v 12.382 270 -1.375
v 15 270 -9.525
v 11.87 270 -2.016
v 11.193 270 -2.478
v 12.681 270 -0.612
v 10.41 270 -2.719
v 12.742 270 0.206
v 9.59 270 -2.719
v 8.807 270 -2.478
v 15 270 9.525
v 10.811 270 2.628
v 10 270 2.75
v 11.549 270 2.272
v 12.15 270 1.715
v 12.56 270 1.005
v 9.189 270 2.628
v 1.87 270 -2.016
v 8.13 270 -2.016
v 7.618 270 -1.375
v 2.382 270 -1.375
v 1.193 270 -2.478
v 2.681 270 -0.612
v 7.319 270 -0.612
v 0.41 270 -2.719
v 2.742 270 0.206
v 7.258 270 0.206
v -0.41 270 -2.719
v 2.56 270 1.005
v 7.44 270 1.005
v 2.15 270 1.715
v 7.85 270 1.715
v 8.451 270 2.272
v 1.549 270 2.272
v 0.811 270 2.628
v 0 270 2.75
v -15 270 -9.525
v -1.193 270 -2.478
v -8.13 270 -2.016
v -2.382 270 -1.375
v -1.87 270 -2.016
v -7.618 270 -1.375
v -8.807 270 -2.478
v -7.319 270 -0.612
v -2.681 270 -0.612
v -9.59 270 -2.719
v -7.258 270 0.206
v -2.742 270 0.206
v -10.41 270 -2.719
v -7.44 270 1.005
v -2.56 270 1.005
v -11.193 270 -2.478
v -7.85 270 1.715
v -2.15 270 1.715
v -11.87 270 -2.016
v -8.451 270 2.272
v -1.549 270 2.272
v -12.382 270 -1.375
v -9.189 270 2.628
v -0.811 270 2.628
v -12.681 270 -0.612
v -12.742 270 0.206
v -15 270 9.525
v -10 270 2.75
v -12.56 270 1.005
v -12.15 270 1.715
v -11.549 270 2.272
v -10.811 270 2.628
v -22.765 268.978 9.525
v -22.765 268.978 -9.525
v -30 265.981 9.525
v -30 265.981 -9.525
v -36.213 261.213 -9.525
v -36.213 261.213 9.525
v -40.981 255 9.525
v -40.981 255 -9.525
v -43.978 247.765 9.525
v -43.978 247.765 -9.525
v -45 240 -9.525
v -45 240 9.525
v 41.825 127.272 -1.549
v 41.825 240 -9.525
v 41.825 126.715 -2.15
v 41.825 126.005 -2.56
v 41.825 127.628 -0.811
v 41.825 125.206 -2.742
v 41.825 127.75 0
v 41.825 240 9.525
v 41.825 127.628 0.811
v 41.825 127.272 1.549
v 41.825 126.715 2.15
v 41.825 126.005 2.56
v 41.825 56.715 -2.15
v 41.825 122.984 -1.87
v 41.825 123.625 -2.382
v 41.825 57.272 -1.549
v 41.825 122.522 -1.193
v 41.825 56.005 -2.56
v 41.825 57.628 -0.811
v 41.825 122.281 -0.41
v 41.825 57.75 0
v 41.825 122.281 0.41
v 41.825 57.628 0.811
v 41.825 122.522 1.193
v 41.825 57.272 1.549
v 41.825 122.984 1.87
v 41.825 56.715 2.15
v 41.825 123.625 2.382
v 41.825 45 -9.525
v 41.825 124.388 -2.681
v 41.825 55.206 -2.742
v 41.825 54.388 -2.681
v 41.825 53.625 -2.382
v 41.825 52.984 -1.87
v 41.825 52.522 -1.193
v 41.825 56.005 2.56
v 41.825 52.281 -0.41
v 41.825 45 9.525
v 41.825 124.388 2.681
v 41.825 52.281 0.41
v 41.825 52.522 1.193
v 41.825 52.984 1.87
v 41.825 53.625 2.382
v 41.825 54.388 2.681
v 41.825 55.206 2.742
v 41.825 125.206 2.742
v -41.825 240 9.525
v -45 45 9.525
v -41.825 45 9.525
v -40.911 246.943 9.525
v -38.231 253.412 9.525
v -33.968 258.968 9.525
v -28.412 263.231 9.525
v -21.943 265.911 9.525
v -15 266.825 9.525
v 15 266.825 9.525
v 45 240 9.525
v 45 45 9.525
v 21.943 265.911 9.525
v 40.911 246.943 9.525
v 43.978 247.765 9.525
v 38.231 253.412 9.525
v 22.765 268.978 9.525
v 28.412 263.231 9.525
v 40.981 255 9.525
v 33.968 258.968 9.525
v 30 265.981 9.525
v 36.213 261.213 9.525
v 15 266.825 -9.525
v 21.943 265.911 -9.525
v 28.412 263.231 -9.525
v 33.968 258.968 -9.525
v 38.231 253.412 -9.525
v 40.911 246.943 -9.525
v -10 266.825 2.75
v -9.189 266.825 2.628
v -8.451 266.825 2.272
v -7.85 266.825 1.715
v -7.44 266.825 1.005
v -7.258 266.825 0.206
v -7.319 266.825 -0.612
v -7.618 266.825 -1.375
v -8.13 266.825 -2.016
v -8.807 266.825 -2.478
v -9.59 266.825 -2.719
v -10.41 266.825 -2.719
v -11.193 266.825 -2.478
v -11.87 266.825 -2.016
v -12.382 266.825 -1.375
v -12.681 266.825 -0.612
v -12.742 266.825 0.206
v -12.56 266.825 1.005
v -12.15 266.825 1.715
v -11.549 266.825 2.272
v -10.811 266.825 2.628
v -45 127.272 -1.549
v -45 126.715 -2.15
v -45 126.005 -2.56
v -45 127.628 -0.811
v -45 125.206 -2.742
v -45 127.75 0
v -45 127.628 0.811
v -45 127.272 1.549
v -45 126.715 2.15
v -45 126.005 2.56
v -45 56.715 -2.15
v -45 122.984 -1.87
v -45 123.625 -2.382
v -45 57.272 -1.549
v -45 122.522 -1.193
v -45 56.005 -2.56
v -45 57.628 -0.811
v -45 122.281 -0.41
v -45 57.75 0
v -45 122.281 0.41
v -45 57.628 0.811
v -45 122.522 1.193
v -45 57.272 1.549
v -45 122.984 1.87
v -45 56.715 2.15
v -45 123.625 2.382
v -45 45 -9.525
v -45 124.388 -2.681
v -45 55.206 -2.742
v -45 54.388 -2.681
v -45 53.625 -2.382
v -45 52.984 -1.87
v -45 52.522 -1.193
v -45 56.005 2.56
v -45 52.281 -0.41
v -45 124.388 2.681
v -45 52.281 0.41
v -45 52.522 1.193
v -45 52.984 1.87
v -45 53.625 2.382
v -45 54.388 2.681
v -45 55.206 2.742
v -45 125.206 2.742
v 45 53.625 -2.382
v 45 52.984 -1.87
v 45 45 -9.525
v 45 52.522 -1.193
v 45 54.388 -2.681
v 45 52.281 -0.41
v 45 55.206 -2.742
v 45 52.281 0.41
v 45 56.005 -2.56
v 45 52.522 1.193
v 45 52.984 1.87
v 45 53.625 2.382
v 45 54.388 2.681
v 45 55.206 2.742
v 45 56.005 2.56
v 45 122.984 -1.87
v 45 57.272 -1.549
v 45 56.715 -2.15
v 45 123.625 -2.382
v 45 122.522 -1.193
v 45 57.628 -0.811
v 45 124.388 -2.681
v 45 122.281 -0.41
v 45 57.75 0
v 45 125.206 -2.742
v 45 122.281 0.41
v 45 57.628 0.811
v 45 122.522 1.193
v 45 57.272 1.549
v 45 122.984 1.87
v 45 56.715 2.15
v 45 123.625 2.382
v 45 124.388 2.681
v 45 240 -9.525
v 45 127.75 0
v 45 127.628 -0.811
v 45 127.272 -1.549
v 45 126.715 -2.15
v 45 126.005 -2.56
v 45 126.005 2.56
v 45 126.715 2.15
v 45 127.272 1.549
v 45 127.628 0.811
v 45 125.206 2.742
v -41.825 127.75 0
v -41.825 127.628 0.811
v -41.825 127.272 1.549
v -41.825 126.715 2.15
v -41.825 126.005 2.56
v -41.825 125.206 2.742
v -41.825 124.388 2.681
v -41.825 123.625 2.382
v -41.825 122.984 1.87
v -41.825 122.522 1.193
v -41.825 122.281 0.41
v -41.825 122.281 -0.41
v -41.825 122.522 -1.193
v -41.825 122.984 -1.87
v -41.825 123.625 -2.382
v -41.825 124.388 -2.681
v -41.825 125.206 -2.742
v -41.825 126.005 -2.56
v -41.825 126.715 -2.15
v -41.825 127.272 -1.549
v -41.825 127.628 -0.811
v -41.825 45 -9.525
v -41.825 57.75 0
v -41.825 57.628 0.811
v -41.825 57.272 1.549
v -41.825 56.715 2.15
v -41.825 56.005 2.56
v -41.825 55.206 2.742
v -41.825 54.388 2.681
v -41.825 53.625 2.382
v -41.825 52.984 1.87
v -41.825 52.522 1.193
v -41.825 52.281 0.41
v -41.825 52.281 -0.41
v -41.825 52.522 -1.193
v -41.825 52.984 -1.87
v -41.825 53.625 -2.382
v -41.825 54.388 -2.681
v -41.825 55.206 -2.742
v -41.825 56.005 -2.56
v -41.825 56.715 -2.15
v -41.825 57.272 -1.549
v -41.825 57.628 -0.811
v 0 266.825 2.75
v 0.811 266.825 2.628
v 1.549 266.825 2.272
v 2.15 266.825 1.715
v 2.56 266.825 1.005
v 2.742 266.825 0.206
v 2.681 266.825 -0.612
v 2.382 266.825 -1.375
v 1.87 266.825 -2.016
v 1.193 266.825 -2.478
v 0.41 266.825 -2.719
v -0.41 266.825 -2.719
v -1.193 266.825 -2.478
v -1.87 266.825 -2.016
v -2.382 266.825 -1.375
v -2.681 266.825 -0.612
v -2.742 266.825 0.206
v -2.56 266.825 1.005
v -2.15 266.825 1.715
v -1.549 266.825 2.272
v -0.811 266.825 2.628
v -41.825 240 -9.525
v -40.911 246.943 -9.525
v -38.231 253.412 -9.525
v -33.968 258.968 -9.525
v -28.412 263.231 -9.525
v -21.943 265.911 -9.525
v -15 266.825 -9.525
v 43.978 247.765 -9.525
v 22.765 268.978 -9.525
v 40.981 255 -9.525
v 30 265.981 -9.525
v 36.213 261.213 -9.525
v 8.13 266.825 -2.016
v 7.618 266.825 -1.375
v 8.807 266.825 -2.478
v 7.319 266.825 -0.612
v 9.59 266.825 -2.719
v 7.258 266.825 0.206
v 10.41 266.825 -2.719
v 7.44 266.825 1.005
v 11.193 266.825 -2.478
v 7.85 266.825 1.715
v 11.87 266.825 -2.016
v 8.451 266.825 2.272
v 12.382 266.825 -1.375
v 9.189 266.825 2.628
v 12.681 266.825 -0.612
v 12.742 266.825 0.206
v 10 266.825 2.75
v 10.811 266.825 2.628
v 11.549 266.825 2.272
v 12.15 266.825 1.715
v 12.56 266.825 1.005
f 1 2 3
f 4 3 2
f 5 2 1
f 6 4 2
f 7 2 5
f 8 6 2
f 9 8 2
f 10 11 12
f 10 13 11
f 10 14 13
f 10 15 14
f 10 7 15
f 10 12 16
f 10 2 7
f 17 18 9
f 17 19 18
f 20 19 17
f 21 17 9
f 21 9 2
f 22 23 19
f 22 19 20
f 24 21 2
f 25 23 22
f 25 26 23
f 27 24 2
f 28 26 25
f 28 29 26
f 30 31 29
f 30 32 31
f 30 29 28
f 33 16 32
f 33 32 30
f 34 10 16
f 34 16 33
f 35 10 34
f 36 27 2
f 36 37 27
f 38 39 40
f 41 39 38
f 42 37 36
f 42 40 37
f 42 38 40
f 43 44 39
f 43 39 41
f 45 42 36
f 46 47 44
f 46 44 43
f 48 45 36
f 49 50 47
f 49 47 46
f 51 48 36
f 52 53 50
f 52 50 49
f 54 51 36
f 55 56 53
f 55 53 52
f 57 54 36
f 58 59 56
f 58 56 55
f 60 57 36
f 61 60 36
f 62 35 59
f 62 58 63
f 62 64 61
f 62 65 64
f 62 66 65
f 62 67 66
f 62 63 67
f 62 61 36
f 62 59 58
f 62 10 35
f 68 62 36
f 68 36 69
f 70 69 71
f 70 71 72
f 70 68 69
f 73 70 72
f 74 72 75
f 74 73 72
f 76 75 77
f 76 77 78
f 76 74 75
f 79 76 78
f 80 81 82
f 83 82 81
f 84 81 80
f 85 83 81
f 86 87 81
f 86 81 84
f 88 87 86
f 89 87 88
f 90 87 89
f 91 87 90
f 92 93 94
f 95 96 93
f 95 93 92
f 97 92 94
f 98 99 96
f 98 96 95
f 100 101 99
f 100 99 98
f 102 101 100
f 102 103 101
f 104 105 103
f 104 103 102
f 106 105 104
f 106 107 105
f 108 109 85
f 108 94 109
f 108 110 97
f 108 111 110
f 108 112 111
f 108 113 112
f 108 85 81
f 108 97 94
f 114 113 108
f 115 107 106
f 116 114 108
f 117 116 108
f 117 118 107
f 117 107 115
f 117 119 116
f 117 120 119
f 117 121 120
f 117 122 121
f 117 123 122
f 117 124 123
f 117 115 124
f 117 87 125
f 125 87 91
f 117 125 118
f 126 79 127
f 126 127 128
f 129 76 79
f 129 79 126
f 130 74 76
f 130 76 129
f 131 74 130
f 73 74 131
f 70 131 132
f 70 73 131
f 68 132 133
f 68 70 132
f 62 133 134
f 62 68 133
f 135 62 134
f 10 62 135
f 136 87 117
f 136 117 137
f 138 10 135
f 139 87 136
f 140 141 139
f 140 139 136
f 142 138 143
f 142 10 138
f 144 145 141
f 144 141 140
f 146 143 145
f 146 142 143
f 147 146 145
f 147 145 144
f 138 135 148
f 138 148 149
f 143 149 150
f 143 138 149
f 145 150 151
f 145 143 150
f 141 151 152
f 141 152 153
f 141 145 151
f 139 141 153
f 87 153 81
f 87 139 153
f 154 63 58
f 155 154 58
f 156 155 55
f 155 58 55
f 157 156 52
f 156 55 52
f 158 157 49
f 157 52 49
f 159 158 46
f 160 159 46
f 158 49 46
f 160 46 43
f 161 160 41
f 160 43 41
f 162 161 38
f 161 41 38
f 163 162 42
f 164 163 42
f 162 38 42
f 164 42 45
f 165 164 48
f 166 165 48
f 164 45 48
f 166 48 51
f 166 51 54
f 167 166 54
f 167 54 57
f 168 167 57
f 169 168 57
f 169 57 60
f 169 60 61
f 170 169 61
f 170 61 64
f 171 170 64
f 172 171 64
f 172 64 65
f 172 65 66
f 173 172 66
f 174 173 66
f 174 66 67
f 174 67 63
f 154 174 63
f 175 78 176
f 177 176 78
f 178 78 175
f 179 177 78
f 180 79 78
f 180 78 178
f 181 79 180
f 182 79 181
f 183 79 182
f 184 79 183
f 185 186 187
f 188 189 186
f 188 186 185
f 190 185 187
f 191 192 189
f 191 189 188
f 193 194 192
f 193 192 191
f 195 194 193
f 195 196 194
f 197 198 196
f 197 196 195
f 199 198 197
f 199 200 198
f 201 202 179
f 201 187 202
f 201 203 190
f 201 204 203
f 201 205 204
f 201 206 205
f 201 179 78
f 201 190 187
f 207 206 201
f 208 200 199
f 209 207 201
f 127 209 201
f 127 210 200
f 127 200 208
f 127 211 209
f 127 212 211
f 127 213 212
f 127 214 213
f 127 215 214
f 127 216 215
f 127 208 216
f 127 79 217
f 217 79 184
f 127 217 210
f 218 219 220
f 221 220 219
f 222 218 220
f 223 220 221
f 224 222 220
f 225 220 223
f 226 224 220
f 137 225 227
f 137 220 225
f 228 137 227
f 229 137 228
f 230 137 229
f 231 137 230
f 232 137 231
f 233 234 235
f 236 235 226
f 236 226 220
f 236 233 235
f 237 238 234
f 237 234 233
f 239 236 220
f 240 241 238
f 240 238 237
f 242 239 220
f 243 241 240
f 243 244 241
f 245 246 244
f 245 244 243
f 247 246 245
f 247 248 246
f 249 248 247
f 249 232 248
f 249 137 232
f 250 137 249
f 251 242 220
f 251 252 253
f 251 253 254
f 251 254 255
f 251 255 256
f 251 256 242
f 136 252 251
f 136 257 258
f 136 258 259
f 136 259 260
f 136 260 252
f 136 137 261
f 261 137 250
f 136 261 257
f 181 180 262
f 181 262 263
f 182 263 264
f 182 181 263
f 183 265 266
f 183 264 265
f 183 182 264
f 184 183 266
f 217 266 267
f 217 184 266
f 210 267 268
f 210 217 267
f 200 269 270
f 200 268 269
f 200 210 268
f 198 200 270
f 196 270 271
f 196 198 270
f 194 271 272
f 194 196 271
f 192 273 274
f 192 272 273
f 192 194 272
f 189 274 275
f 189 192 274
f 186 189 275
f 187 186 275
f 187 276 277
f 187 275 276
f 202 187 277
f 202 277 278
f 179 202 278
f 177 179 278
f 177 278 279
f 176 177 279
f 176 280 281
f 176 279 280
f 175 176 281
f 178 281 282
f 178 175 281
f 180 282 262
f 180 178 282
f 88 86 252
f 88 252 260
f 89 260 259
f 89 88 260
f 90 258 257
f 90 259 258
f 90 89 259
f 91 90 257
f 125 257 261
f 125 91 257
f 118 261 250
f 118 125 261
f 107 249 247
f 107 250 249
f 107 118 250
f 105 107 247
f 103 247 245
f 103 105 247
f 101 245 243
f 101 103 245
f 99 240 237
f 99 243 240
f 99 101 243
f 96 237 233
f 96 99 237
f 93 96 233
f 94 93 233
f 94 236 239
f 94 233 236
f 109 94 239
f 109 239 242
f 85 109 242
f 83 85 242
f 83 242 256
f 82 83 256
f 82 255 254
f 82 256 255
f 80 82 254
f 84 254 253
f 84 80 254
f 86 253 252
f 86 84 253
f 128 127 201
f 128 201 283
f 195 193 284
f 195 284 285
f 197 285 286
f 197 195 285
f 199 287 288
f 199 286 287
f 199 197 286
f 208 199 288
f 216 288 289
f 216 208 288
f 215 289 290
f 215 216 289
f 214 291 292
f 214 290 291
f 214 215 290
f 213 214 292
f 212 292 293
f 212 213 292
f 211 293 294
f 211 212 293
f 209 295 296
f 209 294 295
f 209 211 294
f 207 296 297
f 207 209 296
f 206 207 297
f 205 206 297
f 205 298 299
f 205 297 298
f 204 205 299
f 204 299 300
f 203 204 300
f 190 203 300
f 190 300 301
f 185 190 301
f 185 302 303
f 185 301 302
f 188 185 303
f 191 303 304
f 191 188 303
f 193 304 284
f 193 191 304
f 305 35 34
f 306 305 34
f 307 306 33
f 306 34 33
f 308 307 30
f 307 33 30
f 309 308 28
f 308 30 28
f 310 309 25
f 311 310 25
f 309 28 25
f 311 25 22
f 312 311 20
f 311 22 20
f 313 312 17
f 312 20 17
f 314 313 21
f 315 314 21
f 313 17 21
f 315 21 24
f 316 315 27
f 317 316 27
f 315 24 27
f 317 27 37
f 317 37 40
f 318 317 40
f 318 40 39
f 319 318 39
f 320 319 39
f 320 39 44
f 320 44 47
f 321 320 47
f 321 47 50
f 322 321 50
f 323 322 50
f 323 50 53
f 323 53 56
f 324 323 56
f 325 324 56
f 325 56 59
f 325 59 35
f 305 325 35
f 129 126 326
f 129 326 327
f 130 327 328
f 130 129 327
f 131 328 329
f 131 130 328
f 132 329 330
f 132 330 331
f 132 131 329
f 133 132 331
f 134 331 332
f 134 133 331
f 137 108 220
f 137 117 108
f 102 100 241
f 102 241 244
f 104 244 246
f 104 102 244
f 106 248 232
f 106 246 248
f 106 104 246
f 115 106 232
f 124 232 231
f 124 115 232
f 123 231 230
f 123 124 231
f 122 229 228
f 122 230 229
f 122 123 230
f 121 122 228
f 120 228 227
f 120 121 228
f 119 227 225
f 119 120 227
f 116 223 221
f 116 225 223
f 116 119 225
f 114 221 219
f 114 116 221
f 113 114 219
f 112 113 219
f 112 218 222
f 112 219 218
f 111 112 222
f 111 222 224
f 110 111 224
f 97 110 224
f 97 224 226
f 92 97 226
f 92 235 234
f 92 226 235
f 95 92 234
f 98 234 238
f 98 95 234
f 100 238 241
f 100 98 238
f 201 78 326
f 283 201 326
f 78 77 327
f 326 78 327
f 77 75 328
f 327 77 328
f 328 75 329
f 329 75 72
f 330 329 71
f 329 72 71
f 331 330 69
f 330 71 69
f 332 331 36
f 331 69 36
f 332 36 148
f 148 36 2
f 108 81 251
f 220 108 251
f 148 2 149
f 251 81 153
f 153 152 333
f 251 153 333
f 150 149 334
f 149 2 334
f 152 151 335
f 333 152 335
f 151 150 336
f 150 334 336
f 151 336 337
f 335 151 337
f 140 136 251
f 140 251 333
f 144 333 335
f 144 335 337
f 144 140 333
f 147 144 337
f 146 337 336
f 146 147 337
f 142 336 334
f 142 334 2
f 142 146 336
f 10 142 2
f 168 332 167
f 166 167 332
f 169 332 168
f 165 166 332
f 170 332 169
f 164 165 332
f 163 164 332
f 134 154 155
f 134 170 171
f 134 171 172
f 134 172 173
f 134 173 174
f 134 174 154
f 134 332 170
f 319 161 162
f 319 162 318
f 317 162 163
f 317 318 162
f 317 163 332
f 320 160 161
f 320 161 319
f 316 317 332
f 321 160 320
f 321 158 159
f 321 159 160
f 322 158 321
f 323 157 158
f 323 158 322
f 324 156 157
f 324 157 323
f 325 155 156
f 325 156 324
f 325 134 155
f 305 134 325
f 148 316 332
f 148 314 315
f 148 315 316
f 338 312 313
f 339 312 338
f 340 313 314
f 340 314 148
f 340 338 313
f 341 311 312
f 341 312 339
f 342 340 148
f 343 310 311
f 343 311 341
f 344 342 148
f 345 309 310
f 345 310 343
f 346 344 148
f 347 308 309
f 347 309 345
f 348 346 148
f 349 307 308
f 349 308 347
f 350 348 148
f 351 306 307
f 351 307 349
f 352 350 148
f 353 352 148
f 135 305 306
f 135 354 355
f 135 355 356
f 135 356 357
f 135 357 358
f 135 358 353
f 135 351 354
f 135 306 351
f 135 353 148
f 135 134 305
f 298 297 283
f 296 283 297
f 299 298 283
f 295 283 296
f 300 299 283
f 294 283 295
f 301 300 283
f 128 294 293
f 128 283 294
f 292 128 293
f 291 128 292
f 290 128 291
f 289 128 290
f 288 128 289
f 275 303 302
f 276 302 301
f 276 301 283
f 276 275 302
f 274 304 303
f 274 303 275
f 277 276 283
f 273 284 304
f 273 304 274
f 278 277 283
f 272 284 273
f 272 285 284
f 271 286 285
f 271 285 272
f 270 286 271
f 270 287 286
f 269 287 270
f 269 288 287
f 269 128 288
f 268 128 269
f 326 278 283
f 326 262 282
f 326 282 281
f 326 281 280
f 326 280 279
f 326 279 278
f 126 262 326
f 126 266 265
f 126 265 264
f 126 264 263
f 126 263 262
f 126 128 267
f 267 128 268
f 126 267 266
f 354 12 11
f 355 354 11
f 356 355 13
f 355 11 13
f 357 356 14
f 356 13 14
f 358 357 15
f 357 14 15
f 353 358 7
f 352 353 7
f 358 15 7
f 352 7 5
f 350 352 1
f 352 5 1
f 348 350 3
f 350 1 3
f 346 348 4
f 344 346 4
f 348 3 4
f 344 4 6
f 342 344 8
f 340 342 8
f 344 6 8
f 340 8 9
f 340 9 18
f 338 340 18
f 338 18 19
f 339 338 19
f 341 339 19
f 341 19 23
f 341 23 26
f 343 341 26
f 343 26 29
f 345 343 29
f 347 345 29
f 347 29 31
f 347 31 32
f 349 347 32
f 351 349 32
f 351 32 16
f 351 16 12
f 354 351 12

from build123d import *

# Parameters (mm, degrees)
BOSS_EXTRUDE1_DEPTH     = 9.525
SKETCH12_R              = 2.75
CUT_EXTRUDE2_DEPTH      = 230.653490339
CUT_EXTRUDE3_DEPTH      = 285.764333485
CUT_EXTRUDE3_DEPTH_BACK = 285.764333485
SKETCH13_R              = 2.75


with BuildPart() as part:
    # Sketch1 → Boss-Extrude1 (new, symmetric)
    with BuildSketch(Plane.XY):
        with BuildLine():
            Line((45, 45), (45, 240))
            ThreePointArc((45, 240), (36.213203436, 261.213203436), (15, 270))
            Line((15, 270), (-15, 270))
            ThreePointArc((-15, 270), (-36.213203436, 261.213203436), (-45, 240))
            Line((-45, 240), (-45, 45))
            Line((-45, 45), (-41.825, 45))
            Line((-41.825, 45), (-41.825, 240))
            ThreePointArc((-41.825, 240), (-33.968139405, 258.968139405), (-15, 266.825))
            Line((-15, 266.825), (15, 266.825))
            ThreePointArc((15, 266.825), (33.968139405, 258.968139405), (41.825, 240))
            Line((41.825, 240), (41.825, 45))
            Line((41.825, 45), (45, 45))
        make_face()
    extrude(amount=BOSS_EXTRUDE1_DEPTH, both=True)

    # Sketch12 → Cut-Extrude2 (cut, through all)
    with BuildSketch(Plane(origin=(0, 270, 0), x_dir=(1, 0, 0), z_dir=(0, 1, 0))):
        with Locations(Location((0, 0, 0), (0, 0, 270))):
            Circle(SKETCH12_R)
        with Locations(Location((-10, 0, 0), (0, 0, 270))):
            Circle(SKETCH12_R)
        with Locations(Location((10, 0, 0), (0, 0, 270))):
            Circle(SKETCH12_R)
    extrude(amount=-CUT_EXTRUDE2_DEPTH, mode=Mode.SUBTRACT)

    # Sketch13 → Cut-Extrude3 (cut, two sides: drawn at the far end of the back side and taken through both)
    with BuildSketch(Plane(origin=(45, 0, 0), x_dir=(0, 0, -1), z_dir=(1, 0, 0)).offset(-CUT_EXTRUDE3_DEPTH_BACK)):
        with Locations(Location((0, 125, 0), (0, 0, 90))):
            Circle(SKETCH13_R)
        with Locations(Location((0, 55, 0), (0, 0, 90))):
            Circle(SKETCH13_R)
    extrude(amount=CUT_EXTRUDE3_DEPTH + CUT_EXTRUDE3_DEPTH_BACK, mode=Mode.SUBTRACT)


solid = part.part
